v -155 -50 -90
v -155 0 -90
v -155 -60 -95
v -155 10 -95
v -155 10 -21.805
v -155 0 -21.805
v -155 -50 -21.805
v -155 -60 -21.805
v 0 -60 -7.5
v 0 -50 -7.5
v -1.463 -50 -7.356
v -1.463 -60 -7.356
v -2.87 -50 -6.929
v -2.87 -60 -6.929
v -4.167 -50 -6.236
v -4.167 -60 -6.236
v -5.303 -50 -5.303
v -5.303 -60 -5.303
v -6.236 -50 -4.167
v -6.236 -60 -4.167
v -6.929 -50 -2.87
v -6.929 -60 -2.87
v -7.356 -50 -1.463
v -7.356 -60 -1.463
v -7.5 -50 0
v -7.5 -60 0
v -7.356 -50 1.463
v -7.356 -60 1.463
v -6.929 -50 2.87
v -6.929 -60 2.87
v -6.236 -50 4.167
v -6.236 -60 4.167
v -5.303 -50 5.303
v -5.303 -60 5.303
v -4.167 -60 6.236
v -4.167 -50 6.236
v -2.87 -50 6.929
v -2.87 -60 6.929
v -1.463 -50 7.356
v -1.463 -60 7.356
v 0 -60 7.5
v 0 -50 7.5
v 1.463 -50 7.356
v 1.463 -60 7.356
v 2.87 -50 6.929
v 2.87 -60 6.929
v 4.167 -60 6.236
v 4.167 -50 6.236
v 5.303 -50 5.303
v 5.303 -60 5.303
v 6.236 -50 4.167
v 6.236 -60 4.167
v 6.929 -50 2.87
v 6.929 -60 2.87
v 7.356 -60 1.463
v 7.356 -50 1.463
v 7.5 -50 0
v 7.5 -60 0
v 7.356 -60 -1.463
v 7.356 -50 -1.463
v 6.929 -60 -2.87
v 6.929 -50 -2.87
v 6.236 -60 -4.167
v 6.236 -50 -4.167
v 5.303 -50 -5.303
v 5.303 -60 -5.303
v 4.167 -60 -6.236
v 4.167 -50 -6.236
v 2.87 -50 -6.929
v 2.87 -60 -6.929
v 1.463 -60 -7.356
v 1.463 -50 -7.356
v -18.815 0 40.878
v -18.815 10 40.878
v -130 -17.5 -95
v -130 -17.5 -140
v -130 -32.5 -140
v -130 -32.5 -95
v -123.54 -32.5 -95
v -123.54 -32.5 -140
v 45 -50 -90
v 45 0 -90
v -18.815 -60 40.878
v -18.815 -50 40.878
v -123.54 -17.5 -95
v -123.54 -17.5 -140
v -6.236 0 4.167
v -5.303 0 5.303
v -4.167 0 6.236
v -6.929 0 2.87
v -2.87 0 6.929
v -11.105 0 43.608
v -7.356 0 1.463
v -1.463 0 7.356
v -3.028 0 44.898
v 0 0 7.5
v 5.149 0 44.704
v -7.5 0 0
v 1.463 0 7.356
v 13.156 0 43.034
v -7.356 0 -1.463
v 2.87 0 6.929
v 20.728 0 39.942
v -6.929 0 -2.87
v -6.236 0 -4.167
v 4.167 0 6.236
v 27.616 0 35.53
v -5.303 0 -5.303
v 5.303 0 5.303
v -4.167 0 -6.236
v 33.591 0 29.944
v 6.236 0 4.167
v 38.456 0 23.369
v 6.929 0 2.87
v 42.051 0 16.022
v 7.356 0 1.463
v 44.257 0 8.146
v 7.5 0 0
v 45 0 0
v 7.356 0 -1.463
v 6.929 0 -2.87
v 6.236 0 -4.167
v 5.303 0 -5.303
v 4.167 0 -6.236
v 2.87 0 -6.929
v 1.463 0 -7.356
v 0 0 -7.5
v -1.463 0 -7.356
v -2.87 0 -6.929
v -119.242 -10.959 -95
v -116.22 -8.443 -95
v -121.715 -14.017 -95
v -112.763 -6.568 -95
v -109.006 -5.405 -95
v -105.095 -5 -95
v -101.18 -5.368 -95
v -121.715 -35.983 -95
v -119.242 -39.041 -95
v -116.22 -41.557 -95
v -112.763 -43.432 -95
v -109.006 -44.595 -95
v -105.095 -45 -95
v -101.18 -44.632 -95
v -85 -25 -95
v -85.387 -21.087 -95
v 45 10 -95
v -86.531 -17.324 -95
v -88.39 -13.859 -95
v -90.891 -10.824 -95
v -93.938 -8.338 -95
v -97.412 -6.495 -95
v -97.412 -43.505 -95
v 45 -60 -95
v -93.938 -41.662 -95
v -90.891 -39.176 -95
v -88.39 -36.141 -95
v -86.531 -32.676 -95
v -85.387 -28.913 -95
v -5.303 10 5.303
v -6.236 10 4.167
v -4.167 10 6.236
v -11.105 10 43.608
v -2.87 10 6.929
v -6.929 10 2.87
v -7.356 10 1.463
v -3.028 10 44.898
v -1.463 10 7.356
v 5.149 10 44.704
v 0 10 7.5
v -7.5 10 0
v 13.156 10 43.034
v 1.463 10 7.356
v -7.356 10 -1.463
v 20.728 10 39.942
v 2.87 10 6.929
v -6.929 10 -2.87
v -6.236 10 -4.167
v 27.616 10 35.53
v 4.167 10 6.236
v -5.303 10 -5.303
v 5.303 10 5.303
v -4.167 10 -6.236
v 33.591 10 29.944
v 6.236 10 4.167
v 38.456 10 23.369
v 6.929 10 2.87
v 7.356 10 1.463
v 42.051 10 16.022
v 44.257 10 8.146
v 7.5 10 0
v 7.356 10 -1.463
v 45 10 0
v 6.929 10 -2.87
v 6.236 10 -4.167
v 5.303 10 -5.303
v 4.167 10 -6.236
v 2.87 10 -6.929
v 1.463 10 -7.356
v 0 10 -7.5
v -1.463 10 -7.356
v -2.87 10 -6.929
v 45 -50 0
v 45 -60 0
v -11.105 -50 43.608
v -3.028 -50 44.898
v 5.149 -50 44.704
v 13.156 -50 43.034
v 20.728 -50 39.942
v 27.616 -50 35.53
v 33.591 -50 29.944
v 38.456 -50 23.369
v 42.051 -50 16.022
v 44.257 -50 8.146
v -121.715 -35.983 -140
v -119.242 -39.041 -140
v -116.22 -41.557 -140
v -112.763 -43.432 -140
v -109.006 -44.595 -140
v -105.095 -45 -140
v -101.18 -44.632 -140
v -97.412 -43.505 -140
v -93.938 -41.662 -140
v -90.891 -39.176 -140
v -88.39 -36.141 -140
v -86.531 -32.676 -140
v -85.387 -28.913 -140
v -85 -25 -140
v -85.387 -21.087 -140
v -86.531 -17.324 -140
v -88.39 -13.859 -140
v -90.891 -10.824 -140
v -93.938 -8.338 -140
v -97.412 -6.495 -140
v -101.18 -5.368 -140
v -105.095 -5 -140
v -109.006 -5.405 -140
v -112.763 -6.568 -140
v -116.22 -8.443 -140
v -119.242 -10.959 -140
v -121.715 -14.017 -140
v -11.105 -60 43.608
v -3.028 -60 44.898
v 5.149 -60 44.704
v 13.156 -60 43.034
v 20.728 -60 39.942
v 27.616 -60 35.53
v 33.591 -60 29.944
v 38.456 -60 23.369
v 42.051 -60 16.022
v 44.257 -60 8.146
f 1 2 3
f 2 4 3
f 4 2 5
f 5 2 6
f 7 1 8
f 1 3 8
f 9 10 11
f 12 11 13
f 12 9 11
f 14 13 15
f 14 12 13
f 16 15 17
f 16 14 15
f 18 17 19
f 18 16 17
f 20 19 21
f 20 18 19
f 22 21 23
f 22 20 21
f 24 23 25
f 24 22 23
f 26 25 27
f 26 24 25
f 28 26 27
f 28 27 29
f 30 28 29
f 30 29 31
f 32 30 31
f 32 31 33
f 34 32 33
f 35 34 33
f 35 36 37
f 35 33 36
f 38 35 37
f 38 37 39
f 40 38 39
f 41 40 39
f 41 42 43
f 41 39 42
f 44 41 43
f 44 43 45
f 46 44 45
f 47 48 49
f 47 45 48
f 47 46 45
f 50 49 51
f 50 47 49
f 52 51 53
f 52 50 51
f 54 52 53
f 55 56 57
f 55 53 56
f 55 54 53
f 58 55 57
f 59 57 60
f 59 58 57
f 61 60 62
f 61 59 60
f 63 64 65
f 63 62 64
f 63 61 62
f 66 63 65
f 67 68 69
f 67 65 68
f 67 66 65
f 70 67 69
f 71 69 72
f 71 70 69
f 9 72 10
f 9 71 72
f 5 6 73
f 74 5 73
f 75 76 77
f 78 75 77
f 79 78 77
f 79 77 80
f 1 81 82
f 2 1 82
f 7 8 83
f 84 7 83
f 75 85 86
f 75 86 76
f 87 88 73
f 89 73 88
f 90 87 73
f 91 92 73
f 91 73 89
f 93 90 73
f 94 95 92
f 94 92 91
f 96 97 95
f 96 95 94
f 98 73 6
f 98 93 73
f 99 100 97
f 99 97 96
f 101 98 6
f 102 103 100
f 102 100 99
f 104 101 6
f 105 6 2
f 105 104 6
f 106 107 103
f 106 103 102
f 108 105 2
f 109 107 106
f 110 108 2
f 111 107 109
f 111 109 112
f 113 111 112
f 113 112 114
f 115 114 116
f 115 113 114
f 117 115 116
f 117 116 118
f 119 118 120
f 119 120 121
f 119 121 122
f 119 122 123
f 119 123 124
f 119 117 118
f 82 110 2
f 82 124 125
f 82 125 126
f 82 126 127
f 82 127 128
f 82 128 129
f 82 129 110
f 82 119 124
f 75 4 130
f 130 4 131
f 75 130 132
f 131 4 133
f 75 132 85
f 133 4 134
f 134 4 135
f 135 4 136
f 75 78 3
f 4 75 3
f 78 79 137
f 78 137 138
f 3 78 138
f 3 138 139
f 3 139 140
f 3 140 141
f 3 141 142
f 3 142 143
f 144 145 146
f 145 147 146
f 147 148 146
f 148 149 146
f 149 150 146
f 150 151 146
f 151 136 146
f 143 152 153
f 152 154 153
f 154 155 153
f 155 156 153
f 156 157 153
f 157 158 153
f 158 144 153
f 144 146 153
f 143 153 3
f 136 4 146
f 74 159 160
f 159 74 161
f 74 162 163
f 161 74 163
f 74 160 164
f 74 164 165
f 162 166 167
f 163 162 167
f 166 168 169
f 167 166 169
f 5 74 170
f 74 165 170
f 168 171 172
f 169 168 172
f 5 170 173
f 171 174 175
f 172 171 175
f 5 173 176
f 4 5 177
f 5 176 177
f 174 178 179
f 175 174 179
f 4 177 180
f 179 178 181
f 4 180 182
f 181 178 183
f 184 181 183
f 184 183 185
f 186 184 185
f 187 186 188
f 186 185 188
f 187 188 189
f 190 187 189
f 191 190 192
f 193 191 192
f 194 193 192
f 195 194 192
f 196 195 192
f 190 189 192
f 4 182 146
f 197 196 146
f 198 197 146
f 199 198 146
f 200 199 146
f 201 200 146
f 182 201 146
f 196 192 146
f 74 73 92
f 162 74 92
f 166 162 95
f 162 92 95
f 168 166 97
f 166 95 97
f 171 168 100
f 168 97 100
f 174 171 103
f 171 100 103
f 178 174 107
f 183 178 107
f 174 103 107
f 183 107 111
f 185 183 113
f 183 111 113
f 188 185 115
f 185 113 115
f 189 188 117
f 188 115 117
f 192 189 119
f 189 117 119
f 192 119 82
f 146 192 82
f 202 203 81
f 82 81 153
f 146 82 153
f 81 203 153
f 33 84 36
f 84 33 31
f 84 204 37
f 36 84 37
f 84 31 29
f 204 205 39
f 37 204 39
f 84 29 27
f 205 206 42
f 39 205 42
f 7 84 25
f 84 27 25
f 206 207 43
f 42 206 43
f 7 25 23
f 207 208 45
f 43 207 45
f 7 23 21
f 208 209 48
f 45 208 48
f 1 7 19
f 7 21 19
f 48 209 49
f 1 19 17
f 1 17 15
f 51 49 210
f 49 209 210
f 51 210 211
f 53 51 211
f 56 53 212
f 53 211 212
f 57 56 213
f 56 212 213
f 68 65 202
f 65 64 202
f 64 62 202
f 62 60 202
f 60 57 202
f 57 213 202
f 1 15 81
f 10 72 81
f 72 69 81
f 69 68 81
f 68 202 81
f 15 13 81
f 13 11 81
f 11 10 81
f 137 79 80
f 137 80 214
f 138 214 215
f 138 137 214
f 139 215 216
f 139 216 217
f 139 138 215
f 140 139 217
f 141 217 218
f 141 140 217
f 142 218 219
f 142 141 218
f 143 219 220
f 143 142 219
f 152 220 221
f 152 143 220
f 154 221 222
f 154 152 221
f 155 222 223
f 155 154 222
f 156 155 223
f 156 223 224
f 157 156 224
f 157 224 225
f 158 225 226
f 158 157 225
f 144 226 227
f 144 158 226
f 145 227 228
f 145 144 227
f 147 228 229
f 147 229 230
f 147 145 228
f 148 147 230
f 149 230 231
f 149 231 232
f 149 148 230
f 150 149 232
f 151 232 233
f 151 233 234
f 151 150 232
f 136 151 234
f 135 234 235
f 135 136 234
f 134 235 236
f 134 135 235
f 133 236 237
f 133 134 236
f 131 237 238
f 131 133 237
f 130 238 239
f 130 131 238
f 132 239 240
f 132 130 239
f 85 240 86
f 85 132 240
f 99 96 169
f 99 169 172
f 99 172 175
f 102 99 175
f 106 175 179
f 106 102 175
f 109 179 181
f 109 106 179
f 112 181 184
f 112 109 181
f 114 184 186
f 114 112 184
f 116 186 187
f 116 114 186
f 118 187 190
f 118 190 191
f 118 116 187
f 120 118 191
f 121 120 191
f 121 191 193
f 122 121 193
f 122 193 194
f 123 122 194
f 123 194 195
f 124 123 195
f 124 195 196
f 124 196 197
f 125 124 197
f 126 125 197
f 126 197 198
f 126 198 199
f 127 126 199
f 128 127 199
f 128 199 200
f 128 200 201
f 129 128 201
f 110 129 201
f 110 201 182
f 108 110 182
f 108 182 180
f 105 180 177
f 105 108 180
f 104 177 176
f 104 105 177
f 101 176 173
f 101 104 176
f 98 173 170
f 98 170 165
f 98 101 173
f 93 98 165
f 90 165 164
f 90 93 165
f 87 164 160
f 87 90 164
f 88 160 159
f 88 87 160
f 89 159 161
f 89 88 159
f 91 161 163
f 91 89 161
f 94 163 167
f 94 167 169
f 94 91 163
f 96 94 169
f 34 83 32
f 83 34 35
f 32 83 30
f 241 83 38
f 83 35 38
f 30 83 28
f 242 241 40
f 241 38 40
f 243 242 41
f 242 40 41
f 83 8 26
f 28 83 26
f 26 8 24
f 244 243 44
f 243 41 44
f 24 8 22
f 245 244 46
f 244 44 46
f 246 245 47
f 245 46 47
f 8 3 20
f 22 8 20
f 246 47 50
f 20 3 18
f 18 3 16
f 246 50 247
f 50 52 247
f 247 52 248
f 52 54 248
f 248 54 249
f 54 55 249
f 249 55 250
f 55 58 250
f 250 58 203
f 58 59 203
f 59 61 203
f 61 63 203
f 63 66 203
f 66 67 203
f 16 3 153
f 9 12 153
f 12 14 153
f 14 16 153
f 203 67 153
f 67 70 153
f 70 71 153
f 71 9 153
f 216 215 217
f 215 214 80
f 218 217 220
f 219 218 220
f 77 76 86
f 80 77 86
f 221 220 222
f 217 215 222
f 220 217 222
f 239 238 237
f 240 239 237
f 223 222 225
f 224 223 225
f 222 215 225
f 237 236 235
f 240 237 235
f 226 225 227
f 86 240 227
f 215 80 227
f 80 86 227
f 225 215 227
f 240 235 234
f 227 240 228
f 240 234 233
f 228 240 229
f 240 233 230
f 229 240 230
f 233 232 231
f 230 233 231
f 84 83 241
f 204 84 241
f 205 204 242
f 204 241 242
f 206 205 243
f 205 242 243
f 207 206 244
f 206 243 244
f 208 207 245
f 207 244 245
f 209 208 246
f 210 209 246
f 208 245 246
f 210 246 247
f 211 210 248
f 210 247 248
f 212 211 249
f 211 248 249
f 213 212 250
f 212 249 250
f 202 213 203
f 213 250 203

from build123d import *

# Parameters (mm, degrees)
SKETCH_1_R          = 7.5
EXTRUDE_1_DEPTH     = 10
SKETCH_3_W          = 5
SKETCH_3_H          = 35
EXTRUDE_2_DEPTH     = 200
EXTRUDE_START       = -60
SKETCH_1_2_R        = 7.5
EXTRUDE_3_DEPTH     = 60
SKETCH_7_W          = 135
SKETCH_7_H          = 50
CUT_EXTRUDE_1_DEPTH = 230.401394939
EXTRUDE_4_DEPTH     = 45


with BuildPart() as part:
    # 草图1 → 凸台-拉伸1 (new body)
    with BuildSketch(Plane(origin=(0, 0, 0), x_dir=(1, 0, 0), z_dir=(0, 1, 0))):
        with BuildLine():
            Line((45, 0), (45, 90))
            Line((45, 90), (-155, 90))
            Line((-155, 90), (-155, 21.804554274))
            Line((-155, 21.804554274), (-18.814985094, -40.877822054))
            ThreePointArc((-18.814985094, -40.877822054), (24.272676725, -37.892442051), (45, 0))
        make_face()
        with Locations(Location((0, 0, 0), (0, 0, 270))):
            Circle(SKETCH_1_R, mode=Mode.SUBTRACT)
    extrude(amount=EXTRUDE_1_DEPTH)

    # 草图3 → 凸台-拉伸2 (add)
    with BuildSketch(Plane(origin=(45, 0, 0), x_dir=(0, 0, -1), z_dir=(1, 0, 0))):
        with Locations((92.5, -7.5)):
            Rectangle(SKETCH_3_W, SKETCH_3_H)
    extrude_2 = extrude(amount=-EXTRUDE_2_DEPTH)

    # 镜向5: 凸台-拉伸2 across plane
    add(extrude_2.mirror(Plane(origin=(0, -25, 0), x_dir=(0, 0, 1), z_dir=(0, -1, 0))))

    # 草图1<2> → 凸台-拉伸3 (add)
    with BuildSketch(Plane(origin=(0, 0, 0), x_dir=(1, 0, 0), z_dir=(0, 1, 0)).offset(EXTRUDE_START)):
        with BuildLine():
            Line((45, 0), (45, 90))
            Line((45, 90), (-155, 90))
            Line((-155, 90), (-155, 21.804554274))
            Line((-155, 21.804554274), (-18.814985094, -40.877822054))
            ThreePointArc((-18.814985094, -40.877822054), (24.272676725, -37.892442051), (45, 0))
        make_face()
        with Locations(Location((0, 0, 0), (0, 0, 90))):
            Circle(SKETCH_1_2_R, mode=Mode.SUBTRACT)
    extrude(amount=EXTRUDE_3_DEPTH)

    # 草图7 → 切除-拉伸1 (cut, through all)
    with BuildSketch(Plane(origin=(45, 0, 0), x_dir=(0, 0, -1), z_dir=(1, 0, 0))):
        with Locations((22.5, -25)):
            Rectangle(SKETCH_7_W, SKETCH_7_H)
    extrude(amount=-CUT_EXTRUDE_1_DEPTH, mode=Mode.SUBTRACT)

    # 草图8 → 凸台-拉伸4 (add)
    with BuildSketch(Plane(origin=(0, 0, -95), x_dir=(-1, 0, 0), z_dir=(0, 0, -1))):
        with BuildLine():
            Line((123.540496218, -17.5), (130, -17.5))
            Line((130, -17.5), (130, -32.5))
            Line((130, -32.5), (123.540496218, -32.5))
            ThreePointArc((123.540496218, -32.5), (85, -25), (123.540496218, -17.5))
        make_face()
    extrude(amount=EXTRUDE_4_DEPTH)


solid = part.part
